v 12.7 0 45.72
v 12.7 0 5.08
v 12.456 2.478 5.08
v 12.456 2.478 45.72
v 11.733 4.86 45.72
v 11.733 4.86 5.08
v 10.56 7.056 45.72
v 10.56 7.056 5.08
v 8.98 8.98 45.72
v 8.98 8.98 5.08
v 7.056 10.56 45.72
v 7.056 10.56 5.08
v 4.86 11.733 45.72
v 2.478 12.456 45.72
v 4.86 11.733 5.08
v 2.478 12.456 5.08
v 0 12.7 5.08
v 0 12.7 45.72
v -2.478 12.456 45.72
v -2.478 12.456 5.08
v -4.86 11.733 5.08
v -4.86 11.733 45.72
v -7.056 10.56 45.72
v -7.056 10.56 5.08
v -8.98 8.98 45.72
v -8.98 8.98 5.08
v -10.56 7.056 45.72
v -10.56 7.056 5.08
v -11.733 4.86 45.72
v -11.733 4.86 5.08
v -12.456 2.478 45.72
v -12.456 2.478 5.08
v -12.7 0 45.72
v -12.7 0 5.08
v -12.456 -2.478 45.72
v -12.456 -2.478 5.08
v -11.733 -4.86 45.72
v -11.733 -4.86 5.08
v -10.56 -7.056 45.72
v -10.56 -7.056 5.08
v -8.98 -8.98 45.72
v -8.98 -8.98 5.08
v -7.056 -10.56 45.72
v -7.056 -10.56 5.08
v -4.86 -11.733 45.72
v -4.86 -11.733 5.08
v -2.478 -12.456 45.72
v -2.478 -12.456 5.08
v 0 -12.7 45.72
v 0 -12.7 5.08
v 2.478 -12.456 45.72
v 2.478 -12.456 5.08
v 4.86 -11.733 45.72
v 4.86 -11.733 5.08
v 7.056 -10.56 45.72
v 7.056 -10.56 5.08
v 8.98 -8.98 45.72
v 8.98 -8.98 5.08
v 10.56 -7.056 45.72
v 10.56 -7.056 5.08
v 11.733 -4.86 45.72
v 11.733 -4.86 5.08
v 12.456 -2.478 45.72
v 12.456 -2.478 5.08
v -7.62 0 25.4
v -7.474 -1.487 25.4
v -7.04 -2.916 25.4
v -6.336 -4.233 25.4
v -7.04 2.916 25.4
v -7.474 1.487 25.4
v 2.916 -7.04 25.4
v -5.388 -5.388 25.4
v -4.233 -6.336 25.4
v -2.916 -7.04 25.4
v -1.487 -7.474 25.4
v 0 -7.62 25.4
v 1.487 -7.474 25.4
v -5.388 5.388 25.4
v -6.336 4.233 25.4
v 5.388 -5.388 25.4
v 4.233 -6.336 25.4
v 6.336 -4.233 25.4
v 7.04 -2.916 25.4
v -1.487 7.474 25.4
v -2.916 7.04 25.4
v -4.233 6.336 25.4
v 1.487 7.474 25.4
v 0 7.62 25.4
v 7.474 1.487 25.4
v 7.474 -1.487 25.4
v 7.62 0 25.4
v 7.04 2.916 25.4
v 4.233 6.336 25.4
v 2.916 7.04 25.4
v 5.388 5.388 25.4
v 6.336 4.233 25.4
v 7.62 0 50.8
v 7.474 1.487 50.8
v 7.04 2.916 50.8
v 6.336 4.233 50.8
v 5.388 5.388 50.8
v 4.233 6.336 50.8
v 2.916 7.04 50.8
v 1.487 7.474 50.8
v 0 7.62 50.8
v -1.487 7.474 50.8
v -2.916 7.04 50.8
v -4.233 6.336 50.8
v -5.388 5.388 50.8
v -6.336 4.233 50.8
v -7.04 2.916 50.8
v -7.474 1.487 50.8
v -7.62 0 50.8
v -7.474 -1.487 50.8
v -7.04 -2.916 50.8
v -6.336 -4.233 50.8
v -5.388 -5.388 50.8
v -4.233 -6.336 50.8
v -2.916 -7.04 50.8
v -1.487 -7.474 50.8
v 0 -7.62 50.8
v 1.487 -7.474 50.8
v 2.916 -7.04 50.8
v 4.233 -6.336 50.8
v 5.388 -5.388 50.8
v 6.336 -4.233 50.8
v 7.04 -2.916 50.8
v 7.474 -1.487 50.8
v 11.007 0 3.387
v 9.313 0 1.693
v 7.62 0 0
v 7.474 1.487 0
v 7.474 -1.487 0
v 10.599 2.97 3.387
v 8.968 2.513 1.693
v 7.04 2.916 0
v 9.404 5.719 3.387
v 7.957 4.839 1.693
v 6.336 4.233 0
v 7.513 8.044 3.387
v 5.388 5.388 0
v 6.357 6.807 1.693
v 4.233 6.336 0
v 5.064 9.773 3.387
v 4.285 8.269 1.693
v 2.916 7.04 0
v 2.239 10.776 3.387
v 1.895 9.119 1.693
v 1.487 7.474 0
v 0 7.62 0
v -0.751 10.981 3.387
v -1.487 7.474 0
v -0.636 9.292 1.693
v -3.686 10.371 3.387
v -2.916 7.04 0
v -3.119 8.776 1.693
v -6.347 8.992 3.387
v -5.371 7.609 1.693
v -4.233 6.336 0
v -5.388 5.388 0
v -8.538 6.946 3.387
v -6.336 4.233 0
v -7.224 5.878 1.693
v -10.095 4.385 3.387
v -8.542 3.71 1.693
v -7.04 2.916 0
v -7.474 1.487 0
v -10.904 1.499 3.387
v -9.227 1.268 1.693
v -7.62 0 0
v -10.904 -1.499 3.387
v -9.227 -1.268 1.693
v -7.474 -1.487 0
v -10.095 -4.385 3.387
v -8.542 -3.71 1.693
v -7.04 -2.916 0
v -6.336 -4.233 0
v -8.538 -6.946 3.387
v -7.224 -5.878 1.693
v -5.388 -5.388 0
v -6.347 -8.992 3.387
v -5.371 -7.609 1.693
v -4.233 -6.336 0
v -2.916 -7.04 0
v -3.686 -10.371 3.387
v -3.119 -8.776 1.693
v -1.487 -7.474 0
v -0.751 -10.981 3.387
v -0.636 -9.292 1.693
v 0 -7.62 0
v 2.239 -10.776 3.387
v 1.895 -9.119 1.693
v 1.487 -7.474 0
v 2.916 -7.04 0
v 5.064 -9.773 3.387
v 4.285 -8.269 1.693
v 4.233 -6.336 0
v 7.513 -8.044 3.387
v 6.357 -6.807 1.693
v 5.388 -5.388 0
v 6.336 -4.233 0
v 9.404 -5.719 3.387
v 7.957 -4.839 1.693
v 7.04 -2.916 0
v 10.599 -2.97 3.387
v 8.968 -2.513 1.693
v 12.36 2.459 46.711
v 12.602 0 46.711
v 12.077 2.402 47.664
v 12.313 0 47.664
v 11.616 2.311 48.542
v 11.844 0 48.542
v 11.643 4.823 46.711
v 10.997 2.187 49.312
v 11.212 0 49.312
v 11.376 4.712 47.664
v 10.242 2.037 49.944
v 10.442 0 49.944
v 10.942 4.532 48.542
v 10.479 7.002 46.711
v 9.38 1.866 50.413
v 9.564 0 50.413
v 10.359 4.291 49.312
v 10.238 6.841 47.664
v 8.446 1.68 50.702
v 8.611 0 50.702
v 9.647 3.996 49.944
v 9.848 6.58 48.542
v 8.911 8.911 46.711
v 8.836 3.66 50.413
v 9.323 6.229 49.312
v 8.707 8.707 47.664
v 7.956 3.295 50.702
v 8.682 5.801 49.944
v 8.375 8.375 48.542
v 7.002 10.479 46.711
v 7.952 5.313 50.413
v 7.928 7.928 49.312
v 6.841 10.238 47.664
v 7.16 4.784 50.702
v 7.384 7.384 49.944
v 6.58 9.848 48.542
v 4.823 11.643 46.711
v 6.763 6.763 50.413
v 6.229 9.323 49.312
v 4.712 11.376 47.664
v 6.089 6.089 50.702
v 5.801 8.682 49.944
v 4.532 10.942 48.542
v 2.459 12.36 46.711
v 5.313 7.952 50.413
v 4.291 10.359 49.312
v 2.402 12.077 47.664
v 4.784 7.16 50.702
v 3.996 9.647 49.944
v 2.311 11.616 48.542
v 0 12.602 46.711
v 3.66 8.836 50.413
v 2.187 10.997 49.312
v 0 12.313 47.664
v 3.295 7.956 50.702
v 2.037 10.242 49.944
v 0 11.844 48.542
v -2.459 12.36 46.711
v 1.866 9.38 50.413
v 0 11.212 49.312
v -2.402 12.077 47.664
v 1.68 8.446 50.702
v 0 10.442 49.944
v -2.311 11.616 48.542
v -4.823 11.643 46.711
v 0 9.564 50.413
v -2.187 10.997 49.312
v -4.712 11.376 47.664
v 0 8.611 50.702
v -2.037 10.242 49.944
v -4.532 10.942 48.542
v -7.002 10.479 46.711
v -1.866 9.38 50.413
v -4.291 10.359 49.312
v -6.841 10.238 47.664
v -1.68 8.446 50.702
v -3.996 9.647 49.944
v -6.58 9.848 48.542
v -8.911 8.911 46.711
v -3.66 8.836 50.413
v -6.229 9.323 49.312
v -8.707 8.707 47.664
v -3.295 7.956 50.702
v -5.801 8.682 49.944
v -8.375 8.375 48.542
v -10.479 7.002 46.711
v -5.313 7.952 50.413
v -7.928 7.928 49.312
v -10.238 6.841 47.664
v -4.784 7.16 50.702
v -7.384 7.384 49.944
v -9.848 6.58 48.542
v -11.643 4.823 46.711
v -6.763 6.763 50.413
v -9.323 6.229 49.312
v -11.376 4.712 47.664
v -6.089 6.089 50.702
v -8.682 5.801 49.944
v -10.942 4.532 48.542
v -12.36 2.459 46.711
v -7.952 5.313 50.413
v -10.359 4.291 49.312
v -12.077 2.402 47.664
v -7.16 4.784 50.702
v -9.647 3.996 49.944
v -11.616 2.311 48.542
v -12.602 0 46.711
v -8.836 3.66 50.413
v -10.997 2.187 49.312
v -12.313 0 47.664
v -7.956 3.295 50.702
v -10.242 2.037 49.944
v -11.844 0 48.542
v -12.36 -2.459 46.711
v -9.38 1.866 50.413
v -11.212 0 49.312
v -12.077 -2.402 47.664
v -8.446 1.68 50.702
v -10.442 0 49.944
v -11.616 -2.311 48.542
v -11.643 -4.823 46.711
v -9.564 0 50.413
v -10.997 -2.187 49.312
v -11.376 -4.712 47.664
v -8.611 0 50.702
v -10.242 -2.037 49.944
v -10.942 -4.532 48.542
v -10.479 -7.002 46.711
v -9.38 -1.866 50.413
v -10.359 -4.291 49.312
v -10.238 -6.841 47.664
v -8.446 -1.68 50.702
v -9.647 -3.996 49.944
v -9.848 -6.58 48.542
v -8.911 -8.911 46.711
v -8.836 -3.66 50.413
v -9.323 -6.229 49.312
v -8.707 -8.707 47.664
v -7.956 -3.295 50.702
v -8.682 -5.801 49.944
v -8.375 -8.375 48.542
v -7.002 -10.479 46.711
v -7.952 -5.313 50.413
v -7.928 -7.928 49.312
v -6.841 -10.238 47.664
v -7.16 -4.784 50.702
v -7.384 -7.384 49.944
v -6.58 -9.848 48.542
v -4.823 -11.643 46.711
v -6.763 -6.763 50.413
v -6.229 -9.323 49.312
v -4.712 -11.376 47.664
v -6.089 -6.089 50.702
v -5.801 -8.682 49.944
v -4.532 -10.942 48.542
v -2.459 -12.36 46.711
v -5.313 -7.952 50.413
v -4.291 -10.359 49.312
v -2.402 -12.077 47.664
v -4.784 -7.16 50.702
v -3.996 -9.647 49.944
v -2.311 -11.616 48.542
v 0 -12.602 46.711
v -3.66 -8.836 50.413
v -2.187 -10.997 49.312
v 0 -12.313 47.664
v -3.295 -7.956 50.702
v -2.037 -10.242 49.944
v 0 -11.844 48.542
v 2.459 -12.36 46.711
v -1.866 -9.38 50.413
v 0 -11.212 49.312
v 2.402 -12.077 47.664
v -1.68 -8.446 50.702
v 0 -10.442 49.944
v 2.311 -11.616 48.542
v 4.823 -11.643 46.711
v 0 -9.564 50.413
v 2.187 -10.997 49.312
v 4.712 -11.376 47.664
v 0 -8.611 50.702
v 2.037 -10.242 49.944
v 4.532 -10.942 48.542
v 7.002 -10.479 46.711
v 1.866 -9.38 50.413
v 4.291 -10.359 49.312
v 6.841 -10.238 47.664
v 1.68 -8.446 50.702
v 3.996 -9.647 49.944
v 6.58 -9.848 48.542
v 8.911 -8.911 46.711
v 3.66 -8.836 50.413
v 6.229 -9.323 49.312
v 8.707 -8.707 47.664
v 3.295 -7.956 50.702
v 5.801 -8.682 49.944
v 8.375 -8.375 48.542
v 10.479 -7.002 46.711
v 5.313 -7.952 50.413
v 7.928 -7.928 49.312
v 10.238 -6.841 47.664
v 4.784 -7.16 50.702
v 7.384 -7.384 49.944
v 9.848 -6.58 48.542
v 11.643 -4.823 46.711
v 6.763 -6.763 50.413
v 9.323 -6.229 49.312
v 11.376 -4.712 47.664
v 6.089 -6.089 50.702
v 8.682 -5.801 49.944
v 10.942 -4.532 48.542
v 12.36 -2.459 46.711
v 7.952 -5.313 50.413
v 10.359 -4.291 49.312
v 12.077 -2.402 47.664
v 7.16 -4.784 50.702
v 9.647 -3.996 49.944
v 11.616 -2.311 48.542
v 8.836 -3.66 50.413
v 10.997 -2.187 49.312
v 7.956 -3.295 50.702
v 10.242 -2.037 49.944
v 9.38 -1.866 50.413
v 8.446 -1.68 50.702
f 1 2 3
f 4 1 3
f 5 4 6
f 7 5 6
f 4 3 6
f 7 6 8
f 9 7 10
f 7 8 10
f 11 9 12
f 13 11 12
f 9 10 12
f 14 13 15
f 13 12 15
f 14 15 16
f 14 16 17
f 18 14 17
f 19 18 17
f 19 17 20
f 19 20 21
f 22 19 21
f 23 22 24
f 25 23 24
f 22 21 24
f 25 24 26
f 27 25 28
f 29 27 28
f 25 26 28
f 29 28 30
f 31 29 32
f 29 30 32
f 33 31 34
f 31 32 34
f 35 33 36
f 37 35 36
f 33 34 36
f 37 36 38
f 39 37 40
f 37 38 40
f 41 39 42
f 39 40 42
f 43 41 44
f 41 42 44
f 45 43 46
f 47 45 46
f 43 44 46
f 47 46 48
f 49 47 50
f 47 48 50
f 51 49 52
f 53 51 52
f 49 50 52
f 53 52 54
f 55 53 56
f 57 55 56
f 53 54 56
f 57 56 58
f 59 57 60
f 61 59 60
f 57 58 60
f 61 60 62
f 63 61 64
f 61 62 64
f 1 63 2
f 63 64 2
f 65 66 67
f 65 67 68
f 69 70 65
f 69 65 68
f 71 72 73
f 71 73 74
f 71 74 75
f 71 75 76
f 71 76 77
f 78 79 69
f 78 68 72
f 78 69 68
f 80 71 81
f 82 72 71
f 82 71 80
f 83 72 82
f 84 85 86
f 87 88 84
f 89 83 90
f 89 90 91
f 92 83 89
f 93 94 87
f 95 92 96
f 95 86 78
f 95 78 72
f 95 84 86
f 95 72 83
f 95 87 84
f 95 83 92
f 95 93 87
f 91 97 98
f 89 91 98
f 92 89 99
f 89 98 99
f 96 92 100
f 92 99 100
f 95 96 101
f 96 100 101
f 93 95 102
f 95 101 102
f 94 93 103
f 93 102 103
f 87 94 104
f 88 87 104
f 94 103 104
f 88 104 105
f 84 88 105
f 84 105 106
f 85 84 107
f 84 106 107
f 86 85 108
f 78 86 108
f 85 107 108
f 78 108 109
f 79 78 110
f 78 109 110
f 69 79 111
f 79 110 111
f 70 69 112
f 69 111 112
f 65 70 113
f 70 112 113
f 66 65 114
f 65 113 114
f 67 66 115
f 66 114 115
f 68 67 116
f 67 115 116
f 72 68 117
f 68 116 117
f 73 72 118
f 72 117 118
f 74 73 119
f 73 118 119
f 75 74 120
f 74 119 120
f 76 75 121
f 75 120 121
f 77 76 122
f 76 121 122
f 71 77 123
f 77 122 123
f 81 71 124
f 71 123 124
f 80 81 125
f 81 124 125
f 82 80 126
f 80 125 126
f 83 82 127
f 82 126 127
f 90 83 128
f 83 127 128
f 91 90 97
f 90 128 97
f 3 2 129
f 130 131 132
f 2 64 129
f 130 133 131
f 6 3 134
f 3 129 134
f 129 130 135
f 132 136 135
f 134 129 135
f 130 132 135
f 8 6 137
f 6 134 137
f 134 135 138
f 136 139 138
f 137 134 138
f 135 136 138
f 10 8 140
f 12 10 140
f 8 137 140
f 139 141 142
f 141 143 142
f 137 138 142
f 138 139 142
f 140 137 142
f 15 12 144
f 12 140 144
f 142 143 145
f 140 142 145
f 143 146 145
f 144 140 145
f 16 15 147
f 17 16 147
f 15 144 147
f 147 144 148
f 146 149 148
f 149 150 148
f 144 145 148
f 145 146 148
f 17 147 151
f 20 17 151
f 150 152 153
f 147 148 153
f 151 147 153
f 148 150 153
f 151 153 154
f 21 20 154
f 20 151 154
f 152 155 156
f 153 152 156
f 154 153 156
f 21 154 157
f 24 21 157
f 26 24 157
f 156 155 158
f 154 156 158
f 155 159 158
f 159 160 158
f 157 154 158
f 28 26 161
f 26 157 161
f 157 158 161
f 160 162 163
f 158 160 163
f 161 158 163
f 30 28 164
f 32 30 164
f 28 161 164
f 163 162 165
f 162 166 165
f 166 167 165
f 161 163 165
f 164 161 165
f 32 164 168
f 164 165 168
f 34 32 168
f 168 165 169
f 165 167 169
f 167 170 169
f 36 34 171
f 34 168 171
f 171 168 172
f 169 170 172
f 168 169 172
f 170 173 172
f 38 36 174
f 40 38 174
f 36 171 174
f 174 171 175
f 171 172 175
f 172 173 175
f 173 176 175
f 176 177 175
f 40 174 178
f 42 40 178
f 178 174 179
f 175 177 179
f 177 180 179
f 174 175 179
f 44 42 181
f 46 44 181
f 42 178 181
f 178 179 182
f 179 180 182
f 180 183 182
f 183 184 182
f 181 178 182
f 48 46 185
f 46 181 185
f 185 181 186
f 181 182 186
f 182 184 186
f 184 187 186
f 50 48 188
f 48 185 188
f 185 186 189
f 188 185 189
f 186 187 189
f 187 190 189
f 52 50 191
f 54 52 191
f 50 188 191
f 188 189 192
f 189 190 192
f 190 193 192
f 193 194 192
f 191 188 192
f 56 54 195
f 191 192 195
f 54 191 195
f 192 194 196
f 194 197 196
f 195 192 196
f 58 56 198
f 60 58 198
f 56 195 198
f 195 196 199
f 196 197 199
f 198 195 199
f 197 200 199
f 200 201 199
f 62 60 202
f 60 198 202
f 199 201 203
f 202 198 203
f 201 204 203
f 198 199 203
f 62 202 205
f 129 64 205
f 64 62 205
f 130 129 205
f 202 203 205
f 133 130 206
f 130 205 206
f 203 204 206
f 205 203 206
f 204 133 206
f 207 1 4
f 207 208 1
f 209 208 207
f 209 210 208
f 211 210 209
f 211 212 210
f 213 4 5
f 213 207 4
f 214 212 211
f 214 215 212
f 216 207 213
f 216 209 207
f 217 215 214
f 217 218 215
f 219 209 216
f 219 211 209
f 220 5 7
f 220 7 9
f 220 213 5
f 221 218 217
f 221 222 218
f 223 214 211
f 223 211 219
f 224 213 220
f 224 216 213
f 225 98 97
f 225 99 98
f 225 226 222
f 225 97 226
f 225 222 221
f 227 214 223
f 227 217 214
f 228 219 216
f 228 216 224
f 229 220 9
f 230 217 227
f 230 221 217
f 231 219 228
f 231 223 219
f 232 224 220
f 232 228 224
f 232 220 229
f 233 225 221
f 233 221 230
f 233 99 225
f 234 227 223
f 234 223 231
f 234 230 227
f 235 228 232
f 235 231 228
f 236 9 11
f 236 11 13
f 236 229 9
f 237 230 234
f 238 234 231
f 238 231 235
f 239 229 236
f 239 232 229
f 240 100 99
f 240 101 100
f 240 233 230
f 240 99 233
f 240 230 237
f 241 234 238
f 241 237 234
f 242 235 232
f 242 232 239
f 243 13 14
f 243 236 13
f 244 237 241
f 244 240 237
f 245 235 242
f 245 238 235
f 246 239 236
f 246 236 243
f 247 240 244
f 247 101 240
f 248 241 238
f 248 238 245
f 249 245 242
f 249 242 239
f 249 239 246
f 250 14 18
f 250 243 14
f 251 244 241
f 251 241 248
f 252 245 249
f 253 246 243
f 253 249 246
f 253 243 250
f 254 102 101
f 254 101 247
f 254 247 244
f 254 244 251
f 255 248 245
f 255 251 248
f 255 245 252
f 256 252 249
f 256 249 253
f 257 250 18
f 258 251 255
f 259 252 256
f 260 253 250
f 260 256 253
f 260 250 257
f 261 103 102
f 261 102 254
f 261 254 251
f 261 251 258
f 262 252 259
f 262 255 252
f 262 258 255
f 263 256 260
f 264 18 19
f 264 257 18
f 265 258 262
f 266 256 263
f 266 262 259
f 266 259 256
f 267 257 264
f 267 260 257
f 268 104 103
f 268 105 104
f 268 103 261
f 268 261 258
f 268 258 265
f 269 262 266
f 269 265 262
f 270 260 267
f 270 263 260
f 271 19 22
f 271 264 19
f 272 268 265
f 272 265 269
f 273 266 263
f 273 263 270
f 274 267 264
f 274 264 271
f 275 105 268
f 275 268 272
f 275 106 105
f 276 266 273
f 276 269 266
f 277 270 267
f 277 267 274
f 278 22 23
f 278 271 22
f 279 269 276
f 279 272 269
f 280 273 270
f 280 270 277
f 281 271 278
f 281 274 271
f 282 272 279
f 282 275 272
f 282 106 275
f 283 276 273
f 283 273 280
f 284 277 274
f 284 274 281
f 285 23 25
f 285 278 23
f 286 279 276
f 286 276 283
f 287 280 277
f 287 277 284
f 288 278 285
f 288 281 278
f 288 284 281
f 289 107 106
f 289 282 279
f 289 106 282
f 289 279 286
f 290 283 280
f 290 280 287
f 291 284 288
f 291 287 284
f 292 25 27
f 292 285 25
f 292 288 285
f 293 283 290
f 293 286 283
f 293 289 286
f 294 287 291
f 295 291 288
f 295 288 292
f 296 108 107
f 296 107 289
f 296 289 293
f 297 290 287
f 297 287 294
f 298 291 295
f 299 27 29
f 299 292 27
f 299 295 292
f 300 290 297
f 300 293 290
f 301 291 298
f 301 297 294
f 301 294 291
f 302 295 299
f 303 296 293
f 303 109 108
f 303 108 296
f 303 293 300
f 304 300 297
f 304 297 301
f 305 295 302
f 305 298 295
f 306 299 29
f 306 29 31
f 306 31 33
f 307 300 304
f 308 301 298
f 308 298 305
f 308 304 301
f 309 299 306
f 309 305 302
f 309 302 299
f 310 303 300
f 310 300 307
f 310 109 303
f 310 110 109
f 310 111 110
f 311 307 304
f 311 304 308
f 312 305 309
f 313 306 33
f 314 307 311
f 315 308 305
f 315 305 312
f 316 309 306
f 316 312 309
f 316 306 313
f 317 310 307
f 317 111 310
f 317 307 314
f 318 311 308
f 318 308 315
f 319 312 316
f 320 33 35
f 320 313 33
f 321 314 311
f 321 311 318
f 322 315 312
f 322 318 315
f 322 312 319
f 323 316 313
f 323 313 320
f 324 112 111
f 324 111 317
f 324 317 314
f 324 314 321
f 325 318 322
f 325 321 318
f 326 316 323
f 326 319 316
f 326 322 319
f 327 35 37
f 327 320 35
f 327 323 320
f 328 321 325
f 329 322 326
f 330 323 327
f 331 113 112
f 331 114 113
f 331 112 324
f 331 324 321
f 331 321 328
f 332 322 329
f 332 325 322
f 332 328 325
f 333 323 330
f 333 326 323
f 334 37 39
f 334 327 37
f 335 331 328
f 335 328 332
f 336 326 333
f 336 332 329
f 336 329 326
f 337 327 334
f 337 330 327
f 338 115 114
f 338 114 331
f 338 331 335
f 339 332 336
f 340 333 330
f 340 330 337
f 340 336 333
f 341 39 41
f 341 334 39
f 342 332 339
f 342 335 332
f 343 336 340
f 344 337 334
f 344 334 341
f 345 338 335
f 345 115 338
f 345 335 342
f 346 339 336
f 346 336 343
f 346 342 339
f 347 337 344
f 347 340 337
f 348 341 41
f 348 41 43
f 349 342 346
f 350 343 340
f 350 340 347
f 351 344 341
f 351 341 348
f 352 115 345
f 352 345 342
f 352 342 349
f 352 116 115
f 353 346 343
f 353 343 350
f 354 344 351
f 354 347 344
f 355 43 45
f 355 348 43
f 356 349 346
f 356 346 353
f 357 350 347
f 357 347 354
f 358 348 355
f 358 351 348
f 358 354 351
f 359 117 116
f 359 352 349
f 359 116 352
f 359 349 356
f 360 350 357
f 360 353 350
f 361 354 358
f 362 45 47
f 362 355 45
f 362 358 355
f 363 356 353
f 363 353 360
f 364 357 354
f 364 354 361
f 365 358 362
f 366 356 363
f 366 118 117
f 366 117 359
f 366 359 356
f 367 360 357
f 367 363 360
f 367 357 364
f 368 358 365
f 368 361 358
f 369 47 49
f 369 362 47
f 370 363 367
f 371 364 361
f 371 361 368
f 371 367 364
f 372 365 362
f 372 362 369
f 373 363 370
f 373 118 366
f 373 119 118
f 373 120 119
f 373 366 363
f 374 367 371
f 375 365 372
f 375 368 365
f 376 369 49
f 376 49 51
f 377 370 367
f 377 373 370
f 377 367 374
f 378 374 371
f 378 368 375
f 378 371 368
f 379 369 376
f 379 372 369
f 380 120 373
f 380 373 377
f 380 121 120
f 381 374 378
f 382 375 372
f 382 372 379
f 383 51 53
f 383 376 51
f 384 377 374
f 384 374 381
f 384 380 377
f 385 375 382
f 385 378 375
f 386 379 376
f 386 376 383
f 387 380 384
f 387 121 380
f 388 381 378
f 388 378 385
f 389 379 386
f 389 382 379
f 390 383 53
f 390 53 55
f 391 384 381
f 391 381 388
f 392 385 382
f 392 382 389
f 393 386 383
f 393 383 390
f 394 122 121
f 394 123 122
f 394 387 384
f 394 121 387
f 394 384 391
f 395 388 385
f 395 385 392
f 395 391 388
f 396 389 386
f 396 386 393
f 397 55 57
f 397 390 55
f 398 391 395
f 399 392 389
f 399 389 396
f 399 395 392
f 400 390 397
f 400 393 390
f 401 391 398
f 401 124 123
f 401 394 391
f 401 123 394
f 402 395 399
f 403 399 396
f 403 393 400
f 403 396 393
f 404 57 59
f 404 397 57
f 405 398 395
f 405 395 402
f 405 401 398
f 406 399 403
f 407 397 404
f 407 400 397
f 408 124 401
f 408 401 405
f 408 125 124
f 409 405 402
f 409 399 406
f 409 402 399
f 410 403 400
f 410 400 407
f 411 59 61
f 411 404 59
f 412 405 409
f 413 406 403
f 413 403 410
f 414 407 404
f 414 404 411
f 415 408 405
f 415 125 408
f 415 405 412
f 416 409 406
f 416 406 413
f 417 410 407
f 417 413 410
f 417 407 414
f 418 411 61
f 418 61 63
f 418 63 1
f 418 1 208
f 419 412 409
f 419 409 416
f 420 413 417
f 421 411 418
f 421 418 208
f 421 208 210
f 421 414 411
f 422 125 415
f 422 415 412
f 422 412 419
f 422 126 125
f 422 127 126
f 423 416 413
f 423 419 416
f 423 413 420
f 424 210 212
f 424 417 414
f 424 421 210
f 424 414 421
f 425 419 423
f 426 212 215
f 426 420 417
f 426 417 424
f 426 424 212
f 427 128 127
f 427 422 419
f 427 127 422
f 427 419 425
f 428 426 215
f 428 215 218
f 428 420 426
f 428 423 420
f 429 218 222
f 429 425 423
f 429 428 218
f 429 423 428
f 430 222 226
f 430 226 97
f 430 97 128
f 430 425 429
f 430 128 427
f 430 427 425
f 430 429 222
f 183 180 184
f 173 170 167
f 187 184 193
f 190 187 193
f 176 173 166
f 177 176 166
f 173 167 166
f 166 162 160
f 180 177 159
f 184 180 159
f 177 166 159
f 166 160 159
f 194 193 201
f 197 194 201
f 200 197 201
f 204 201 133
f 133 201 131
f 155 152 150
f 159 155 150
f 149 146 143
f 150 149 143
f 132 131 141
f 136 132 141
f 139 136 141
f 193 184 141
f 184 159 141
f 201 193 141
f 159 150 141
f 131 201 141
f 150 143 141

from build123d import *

# Parameters (mm, degrees)
F0_R      = 12.7
F1_DEPTH  = 50.8
F2_R      = 5.08
F3_SIZE   = 5.08
F1_FACE_R = 7.62
F4_DEPTH  = 25.4


with BuildPart() as f1:
    # F0 (on Top) → F1 (new body)
    with BuildSketch(Plane.XY):
        Circle(F0_R)
    extrude(amount=F1_DEPTH)

    # F2
    f2_edges = [f1.edges().sort_by_distance(p)[0] for p in [
        (-12.7, 0, 50.8),
    ]]
    fillet(f2_edges, radius=F2_R)

    # F3
    f3_edges = [f1.edges().sort_by_distance(p)[0] for p in [
        (-12.7, 0, 0),
    ]]
    chamfer(f3_edges, length=F3_SIZE)

    # F1_face (on face) → F4 (cut)
    with BuildSketch(Plane.XY.offset(50.8)):
        Circle(F1_FACE_R)
    extrude(amount=-F4_DEPTH, mode=Mode.SUBTRACT)


solid = f1.part
